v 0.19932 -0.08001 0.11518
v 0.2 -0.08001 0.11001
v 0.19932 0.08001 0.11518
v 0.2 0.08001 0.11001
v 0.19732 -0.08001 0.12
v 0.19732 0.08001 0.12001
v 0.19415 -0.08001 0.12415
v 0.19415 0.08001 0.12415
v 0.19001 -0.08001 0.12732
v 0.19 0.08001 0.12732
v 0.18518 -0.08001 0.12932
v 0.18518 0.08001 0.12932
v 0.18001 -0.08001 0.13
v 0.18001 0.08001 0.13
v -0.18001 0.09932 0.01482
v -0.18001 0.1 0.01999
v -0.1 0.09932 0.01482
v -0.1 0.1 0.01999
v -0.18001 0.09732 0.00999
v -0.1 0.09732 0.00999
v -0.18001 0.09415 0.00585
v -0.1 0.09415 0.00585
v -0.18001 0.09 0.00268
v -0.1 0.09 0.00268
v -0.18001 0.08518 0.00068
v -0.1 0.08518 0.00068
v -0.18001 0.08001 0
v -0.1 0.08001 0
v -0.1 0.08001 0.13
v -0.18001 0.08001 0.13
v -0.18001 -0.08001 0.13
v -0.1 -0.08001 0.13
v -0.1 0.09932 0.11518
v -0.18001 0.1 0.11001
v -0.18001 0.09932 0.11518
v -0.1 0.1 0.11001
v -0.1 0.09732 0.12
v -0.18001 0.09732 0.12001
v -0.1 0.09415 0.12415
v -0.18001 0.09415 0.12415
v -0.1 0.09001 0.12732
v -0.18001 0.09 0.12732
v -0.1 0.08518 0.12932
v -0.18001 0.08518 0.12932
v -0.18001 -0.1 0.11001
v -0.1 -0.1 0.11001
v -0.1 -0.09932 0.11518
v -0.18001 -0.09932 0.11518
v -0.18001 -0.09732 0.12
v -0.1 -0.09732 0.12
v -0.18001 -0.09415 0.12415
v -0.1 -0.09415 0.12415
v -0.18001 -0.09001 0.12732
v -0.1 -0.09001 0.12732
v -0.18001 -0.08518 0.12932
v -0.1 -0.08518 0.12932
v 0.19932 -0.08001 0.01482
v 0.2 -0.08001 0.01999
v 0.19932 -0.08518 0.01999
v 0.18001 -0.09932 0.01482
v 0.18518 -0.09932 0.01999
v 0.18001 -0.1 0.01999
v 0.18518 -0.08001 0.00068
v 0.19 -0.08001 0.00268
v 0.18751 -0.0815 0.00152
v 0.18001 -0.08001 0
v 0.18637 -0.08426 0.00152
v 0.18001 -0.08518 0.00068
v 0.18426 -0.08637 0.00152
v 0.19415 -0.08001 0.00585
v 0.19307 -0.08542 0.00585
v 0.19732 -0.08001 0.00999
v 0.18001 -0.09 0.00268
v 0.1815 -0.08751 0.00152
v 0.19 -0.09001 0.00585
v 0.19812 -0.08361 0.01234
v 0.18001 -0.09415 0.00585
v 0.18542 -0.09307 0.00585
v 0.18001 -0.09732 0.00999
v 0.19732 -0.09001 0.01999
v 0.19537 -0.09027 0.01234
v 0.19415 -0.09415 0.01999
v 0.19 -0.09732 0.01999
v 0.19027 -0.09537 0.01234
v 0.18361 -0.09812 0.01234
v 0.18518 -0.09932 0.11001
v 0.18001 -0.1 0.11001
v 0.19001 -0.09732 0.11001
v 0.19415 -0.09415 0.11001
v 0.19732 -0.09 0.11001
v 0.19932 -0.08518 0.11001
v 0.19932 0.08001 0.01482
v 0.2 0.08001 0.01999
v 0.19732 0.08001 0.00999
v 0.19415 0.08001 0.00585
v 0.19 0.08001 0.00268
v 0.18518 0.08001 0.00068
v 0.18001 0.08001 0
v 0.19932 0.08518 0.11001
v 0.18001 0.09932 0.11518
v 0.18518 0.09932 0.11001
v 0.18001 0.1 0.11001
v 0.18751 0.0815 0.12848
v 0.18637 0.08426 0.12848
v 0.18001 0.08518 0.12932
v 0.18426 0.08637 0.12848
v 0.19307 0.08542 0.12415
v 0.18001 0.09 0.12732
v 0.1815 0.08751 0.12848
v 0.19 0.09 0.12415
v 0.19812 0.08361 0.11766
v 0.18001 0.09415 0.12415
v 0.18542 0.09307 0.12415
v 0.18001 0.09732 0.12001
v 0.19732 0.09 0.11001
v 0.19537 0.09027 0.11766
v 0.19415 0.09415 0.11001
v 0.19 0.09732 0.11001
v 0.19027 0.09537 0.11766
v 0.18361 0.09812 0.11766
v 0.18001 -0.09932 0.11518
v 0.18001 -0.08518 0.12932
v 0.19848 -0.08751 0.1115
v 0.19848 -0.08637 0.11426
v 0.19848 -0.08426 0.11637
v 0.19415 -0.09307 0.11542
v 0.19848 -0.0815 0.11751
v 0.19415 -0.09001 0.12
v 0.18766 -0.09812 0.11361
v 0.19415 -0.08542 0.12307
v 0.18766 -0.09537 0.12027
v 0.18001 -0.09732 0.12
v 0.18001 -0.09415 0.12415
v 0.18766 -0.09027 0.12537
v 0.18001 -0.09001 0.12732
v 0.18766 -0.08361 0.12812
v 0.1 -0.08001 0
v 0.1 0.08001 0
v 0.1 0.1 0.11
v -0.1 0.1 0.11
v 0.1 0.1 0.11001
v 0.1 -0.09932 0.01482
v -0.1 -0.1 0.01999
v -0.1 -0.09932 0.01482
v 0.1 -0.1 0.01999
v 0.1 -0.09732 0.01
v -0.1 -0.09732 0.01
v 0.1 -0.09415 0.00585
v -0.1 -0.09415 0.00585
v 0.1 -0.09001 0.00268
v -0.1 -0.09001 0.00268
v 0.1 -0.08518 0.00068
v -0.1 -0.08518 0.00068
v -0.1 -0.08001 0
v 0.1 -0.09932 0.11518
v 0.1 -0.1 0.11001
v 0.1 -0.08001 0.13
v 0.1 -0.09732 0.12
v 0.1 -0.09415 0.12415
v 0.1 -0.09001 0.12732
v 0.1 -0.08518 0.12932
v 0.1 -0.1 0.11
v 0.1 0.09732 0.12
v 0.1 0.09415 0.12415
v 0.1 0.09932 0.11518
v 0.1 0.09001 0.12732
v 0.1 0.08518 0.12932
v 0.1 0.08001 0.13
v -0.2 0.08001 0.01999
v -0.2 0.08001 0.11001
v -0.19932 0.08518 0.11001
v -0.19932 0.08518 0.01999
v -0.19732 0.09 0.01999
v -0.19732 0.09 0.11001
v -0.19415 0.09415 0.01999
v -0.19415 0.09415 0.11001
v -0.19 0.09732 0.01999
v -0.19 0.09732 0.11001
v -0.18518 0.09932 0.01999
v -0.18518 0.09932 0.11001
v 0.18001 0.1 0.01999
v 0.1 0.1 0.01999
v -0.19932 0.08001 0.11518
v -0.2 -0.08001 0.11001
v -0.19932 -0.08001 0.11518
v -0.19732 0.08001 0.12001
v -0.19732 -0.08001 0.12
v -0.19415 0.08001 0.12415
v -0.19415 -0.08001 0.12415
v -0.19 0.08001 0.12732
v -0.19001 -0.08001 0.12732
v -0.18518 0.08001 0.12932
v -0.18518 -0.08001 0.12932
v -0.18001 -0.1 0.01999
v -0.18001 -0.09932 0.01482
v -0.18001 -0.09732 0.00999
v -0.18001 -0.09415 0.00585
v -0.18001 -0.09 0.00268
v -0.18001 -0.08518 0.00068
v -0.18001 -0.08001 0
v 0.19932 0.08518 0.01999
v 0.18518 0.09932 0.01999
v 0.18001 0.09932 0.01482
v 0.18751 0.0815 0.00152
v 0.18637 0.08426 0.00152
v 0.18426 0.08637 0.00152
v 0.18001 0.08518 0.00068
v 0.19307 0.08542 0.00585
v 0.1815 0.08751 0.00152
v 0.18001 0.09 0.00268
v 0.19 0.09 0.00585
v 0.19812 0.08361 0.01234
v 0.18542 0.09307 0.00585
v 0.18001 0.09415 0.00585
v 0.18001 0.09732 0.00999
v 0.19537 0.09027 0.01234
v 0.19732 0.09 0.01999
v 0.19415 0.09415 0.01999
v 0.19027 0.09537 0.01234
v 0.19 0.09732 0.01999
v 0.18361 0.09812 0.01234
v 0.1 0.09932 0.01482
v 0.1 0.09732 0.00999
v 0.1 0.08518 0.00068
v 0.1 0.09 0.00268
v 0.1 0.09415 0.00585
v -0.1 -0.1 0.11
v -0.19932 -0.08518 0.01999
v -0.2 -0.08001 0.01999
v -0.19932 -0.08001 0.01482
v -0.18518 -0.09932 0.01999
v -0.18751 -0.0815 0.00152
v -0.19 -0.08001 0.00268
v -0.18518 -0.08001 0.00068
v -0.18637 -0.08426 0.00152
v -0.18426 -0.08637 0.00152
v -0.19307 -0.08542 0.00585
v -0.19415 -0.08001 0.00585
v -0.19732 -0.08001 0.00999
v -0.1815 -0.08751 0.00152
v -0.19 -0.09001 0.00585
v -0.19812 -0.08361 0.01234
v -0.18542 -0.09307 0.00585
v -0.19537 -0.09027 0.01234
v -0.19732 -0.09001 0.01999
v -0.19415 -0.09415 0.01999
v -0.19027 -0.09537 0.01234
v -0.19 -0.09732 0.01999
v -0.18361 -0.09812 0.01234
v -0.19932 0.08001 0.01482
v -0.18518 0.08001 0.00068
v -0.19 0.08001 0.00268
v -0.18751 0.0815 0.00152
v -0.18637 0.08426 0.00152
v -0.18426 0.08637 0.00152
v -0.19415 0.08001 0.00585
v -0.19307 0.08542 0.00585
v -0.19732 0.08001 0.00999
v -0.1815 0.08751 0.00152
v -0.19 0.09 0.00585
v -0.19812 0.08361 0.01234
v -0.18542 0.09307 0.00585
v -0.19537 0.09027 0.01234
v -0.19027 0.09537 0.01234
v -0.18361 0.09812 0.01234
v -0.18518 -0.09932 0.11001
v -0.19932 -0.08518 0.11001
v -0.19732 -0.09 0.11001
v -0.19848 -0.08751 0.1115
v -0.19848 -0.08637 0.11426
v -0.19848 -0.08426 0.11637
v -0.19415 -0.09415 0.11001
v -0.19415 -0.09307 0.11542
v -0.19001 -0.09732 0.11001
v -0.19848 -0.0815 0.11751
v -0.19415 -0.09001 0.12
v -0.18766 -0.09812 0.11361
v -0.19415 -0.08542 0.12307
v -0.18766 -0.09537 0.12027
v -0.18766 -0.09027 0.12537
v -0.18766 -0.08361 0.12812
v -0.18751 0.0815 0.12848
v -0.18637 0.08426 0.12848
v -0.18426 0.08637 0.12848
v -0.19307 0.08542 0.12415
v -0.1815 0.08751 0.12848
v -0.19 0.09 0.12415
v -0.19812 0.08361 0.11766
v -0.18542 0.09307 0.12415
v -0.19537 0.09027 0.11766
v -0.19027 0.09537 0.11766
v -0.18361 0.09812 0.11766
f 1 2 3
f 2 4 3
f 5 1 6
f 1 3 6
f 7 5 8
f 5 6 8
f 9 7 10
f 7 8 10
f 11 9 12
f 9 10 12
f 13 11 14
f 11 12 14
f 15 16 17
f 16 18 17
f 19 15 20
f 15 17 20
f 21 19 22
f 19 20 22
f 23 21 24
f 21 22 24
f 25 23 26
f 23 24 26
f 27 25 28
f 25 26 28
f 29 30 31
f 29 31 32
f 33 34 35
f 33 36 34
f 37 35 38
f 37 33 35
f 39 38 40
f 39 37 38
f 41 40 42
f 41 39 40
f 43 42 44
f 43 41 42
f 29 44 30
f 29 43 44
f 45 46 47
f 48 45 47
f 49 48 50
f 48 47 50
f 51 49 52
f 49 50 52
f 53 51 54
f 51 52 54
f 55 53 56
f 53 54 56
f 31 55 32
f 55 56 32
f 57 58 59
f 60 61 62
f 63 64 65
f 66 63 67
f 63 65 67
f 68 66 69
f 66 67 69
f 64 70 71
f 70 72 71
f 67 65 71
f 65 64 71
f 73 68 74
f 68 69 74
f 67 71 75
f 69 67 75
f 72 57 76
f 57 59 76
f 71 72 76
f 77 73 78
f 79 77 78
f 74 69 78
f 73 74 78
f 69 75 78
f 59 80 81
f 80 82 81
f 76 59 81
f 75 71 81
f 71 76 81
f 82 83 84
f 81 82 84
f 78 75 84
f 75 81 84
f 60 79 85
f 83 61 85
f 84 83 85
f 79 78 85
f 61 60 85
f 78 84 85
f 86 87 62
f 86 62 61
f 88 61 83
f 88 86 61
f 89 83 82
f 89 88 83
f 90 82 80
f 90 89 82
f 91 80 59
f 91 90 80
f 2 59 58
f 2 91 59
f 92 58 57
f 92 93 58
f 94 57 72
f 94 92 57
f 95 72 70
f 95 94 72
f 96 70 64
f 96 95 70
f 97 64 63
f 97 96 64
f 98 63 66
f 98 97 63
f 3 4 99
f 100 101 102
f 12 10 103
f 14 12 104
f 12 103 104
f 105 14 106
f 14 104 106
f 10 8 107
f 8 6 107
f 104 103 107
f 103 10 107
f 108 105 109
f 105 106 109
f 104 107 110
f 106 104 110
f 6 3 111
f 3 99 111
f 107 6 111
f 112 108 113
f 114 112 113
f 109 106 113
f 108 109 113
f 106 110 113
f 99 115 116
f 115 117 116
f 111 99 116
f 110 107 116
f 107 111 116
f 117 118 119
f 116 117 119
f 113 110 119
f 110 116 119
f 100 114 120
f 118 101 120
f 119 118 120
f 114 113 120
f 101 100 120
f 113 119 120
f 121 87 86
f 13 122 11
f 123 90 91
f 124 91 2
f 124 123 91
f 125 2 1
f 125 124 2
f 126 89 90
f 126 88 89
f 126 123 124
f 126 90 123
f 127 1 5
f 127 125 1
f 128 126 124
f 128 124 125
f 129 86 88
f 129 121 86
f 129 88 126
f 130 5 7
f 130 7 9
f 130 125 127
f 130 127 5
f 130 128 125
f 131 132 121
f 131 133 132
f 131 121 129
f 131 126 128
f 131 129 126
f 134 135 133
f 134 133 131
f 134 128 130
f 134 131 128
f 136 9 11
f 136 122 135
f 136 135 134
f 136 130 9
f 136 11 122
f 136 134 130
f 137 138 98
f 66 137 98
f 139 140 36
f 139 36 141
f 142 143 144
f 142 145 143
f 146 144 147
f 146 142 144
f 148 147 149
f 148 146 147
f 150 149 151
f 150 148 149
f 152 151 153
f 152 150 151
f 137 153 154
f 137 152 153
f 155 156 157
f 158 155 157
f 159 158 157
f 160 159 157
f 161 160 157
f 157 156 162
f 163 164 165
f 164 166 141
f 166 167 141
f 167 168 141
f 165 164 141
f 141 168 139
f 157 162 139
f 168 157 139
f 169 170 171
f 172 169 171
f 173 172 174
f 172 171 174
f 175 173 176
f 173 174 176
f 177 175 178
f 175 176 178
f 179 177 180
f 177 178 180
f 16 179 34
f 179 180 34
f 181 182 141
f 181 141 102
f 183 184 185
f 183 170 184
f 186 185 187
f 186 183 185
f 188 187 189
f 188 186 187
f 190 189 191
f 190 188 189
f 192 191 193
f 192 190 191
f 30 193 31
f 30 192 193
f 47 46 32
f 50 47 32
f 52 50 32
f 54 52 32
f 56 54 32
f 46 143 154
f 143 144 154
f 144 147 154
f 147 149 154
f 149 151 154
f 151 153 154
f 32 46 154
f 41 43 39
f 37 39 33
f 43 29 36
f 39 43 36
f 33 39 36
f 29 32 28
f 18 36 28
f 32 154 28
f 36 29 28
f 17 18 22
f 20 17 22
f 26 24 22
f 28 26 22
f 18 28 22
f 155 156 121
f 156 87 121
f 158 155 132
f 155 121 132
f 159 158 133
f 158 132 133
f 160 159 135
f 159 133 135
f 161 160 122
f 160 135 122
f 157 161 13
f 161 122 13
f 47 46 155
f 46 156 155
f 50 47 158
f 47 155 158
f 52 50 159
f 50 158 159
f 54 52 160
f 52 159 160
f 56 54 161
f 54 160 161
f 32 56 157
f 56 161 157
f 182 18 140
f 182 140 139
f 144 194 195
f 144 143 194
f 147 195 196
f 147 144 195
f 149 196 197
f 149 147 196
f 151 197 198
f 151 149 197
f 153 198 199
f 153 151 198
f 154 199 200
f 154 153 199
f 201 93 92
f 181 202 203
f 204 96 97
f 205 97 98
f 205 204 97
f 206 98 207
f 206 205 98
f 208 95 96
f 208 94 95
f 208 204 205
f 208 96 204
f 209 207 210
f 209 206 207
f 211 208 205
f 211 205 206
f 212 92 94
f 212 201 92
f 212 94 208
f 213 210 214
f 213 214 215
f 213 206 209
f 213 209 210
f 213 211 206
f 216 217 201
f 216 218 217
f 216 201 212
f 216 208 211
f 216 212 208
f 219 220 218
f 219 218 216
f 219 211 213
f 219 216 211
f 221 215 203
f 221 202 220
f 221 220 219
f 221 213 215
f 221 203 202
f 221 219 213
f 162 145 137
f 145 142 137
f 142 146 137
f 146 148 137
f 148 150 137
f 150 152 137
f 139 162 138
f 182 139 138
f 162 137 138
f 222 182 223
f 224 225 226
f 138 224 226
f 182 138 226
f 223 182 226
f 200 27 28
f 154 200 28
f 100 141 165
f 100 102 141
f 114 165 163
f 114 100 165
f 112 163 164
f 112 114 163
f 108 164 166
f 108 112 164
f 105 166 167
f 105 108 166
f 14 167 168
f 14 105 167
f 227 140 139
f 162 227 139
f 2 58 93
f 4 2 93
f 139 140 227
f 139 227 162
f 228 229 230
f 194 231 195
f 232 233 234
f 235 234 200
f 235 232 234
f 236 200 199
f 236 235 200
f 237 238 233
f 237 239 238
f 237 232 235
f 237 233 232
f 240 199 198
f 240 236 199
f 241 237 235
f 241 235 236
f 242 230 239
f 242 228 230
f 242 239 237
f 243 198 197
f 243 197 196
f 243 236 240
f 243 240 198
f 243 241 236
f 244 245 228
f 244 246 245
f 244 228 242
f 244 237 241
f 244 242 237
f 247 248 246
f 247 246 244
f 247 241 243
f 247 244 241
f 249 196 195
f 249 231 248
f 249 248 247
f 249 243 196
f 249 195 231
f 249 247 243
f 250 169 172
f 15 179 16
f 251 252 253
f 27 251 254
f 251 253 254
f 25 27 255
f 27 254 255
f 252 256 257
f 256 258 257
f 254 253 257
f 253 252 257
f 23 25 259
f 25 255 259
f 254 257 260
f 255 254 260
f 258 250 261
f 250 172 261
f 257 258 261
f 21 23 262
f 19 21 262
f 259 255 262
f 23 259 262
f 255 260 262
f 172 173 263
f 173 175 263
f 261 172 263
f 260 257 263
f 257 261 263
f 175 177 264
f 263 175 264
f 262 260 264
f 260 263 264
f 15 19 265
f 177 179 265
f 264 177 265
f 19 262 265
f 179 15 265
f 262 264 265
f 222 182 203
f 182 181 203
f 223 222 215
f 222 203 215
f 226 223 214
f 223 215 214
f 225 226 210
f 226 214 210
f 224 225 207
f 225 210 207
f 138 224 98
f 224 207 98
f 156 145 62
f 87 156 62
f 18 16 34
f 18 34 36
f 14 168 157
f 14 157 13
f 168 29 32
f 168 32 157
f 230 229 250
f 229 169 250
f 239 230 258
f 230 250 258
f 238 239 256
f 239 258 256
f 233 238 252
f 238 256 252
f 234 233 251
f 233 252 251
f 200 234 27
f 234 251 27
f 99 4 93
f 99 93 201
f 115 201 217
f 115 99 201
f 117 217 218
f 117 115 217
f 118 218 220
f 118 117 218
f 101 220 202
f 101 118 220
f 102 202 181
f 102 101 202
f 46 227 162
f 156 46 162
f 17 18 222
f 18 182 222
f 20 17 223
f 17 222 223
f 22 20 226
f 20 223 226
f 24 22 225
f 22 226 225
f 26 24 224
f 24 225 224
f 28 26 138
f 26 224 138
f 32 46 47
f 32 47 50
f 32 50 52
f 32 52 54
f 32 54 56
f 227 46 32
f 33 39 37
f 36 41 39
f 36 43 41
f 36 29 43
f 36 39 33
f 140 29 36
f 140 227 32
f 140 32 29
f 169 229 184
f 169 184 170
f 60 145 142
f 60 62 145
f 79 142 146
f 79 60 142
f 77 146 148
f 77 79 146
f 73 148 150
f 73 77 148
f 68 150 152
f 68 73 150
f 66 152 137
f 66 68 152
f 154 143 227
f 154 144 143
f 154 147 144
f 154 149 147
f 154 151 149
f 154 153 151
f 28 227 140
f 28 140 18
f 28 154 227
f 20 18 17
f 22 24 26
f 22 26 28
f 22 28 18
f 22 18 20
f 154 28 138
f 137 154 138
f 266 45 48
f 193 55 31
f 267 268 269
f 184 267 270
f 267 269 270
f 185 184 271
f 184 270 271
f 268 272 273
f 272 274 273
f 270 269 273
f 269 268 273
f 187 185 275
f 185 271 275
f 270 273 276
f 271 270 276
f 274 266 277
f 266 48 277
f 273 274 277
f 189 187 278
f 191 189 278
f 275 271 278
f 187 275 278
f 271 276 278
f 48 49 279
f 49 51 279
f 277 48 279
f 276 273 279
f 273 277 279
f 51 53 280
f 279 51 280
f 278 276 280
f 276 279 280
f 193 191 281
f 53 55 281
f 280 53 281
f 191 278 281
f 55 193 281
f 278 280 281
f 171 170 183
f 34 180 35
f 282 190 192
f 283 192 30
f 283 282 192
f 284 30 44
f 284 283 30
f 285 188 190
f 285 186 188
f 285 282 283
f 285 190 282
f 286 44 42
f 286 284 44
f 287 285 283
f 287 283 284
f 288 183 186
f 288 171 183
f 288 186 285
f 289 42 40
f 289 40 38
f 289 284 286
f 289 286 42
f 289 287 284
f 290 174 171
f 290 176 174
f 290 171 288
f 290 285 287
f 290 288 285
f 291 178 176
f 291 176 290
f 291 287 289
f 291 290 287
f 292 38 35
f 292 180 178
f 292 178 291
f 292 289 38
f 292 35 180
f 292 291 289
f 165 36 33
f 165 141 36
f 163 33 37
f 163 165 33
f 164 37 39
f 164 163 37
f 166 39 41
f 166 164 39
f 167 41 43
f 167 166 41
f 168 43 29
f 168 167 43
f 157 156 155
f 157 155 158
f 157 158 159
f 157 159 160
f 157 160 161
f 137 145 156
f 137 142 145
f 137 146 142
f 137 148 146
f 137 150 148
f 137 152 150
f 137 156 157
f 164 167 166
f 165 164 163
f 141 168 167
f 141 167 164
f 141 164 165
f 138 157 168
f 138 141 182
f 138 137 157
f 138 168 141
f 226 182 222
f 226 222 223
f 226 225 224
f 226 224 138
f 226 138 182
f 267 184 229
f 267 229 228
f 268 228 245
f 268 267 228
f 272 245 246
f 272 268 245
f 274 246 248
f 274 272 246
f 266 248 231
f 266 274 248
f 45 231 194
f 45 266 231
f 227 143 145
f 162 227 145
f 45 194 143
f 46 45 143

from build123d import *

# Parameters (mm, degrees)
F2_W     = 0.2
F2_H     = 0.2
F3_DEPTH = 0.11
F2_W_2   = 0.1
F4_DEPTH = 0.13
F5_DEPTH = 0.13
F6_DEPTH = 0.02
F7_R     = 0.01999
F7_2_R   = 0.01999
F7_3_R   = 0.01999
F7_4_R   = 0.01999


# Not quite as in the source:
# - a fillet or chamfer is up to 0.001 mm smaller than in the source, because OpenCascade refuses the exact size


with BuildPart() as f3:
    # F2 (on Top) → F3 (new body)
    with BuildSketch(Plane.XY):
        Rectangle(F2_W, F2_H)
    extrude(amount=F3_DEPTH)


with BuildPart() as f4:
    # F2 (on Top) → F4 (new body)
    with BuildSketch(Plane.XY):
        with Locations((-0.15, 0)):
            Rectangle(F2_W_2, F2_H)
    extrude(amount=F4_DEPTH)

    # F7 (radius 0.02 in the source; OpenCascade refuses exactly that, so slightly less here)
    f7_edges = [f4.edges().sort_by_distance(p)[0] for p in [
        (-0.15, -0.1, 0.13),
        (-0.2, 0.1, 0.065),
        (-0.2, -0.1, 0.065),
        (-0.2, 0, 0),
        (-0.2, 0, 0.13),
        (-0.15, 0.1, 0.13),
        (-0.15, 0.1, 0),
        (-0.15, -0.1, 0),
    ]]
    fillet(f7_edges, radius=F7_R)


with BuildPart() as f5:
    # F2 (on Top) → F5 (new body)
    with BuildSketch(Plane.XY):
        with Locations((0.15, 0)):
            Rectangle(F2_W_2, F2_H)
    extrude(amount=F5_DEPTH)

    # F7#2 (radius 0.02 in the source; OpenCascade refuses exactly that, so slightly less here)
    f7_2_edges = [f5.edges().sort_by_distance(p)[0] for p in [
        (0.15, -0.1, 0.13),
        (0.2, -0.1, 0.065),
        (0.2, 0.1, 0.065),
        (0.2, 0, 0),
        (0.2, 0, 0.13),
        (0.15, 0.1, 0.13),
        (0.15, 0.1, 0),
        (0.15, -0.1, 0),
    ]]
    fillet(f7_2_edges, radius=F7_2_R)


with BuildPart() as f6:
    # F6 (new): a face of the model
    f6_faces = [f3.part.faces().sort_by_distance(p)[0] for p in [
        (0, 0, 0.11),
    ]]
    extrude(f6_faces, amount=F6_DEPTH)

    # F7#4 (radius 0.02 in the source; OpenCascade refuses exactly that, so slightly less here)
    f7_4_edges = [f6.edges().sort_by_distance(p)[0] for p in [
        (0, -0.1, 0.13),
        (0, 0.1, 0.13),
    ]]
    fillet(f7_4_edges, radius=F7_4_R)


with BuildPart() as f3_1:
    add(f3.part)

    # F7#3 (radius 0.02 in the source; OpenCascade refuses exactly that, so slightly less here)
    f7_3_edges = [f3_1.edges().sort_by_distance(p)[0] for p in [
        (0, 0.1, 0),
        (0, -0.1, 0),
    ]]
    fillet(f7_3_edges, radius=F7_3_R)


solid = Compound([f4.part, f5.part, f6.part, f3_1.part])
